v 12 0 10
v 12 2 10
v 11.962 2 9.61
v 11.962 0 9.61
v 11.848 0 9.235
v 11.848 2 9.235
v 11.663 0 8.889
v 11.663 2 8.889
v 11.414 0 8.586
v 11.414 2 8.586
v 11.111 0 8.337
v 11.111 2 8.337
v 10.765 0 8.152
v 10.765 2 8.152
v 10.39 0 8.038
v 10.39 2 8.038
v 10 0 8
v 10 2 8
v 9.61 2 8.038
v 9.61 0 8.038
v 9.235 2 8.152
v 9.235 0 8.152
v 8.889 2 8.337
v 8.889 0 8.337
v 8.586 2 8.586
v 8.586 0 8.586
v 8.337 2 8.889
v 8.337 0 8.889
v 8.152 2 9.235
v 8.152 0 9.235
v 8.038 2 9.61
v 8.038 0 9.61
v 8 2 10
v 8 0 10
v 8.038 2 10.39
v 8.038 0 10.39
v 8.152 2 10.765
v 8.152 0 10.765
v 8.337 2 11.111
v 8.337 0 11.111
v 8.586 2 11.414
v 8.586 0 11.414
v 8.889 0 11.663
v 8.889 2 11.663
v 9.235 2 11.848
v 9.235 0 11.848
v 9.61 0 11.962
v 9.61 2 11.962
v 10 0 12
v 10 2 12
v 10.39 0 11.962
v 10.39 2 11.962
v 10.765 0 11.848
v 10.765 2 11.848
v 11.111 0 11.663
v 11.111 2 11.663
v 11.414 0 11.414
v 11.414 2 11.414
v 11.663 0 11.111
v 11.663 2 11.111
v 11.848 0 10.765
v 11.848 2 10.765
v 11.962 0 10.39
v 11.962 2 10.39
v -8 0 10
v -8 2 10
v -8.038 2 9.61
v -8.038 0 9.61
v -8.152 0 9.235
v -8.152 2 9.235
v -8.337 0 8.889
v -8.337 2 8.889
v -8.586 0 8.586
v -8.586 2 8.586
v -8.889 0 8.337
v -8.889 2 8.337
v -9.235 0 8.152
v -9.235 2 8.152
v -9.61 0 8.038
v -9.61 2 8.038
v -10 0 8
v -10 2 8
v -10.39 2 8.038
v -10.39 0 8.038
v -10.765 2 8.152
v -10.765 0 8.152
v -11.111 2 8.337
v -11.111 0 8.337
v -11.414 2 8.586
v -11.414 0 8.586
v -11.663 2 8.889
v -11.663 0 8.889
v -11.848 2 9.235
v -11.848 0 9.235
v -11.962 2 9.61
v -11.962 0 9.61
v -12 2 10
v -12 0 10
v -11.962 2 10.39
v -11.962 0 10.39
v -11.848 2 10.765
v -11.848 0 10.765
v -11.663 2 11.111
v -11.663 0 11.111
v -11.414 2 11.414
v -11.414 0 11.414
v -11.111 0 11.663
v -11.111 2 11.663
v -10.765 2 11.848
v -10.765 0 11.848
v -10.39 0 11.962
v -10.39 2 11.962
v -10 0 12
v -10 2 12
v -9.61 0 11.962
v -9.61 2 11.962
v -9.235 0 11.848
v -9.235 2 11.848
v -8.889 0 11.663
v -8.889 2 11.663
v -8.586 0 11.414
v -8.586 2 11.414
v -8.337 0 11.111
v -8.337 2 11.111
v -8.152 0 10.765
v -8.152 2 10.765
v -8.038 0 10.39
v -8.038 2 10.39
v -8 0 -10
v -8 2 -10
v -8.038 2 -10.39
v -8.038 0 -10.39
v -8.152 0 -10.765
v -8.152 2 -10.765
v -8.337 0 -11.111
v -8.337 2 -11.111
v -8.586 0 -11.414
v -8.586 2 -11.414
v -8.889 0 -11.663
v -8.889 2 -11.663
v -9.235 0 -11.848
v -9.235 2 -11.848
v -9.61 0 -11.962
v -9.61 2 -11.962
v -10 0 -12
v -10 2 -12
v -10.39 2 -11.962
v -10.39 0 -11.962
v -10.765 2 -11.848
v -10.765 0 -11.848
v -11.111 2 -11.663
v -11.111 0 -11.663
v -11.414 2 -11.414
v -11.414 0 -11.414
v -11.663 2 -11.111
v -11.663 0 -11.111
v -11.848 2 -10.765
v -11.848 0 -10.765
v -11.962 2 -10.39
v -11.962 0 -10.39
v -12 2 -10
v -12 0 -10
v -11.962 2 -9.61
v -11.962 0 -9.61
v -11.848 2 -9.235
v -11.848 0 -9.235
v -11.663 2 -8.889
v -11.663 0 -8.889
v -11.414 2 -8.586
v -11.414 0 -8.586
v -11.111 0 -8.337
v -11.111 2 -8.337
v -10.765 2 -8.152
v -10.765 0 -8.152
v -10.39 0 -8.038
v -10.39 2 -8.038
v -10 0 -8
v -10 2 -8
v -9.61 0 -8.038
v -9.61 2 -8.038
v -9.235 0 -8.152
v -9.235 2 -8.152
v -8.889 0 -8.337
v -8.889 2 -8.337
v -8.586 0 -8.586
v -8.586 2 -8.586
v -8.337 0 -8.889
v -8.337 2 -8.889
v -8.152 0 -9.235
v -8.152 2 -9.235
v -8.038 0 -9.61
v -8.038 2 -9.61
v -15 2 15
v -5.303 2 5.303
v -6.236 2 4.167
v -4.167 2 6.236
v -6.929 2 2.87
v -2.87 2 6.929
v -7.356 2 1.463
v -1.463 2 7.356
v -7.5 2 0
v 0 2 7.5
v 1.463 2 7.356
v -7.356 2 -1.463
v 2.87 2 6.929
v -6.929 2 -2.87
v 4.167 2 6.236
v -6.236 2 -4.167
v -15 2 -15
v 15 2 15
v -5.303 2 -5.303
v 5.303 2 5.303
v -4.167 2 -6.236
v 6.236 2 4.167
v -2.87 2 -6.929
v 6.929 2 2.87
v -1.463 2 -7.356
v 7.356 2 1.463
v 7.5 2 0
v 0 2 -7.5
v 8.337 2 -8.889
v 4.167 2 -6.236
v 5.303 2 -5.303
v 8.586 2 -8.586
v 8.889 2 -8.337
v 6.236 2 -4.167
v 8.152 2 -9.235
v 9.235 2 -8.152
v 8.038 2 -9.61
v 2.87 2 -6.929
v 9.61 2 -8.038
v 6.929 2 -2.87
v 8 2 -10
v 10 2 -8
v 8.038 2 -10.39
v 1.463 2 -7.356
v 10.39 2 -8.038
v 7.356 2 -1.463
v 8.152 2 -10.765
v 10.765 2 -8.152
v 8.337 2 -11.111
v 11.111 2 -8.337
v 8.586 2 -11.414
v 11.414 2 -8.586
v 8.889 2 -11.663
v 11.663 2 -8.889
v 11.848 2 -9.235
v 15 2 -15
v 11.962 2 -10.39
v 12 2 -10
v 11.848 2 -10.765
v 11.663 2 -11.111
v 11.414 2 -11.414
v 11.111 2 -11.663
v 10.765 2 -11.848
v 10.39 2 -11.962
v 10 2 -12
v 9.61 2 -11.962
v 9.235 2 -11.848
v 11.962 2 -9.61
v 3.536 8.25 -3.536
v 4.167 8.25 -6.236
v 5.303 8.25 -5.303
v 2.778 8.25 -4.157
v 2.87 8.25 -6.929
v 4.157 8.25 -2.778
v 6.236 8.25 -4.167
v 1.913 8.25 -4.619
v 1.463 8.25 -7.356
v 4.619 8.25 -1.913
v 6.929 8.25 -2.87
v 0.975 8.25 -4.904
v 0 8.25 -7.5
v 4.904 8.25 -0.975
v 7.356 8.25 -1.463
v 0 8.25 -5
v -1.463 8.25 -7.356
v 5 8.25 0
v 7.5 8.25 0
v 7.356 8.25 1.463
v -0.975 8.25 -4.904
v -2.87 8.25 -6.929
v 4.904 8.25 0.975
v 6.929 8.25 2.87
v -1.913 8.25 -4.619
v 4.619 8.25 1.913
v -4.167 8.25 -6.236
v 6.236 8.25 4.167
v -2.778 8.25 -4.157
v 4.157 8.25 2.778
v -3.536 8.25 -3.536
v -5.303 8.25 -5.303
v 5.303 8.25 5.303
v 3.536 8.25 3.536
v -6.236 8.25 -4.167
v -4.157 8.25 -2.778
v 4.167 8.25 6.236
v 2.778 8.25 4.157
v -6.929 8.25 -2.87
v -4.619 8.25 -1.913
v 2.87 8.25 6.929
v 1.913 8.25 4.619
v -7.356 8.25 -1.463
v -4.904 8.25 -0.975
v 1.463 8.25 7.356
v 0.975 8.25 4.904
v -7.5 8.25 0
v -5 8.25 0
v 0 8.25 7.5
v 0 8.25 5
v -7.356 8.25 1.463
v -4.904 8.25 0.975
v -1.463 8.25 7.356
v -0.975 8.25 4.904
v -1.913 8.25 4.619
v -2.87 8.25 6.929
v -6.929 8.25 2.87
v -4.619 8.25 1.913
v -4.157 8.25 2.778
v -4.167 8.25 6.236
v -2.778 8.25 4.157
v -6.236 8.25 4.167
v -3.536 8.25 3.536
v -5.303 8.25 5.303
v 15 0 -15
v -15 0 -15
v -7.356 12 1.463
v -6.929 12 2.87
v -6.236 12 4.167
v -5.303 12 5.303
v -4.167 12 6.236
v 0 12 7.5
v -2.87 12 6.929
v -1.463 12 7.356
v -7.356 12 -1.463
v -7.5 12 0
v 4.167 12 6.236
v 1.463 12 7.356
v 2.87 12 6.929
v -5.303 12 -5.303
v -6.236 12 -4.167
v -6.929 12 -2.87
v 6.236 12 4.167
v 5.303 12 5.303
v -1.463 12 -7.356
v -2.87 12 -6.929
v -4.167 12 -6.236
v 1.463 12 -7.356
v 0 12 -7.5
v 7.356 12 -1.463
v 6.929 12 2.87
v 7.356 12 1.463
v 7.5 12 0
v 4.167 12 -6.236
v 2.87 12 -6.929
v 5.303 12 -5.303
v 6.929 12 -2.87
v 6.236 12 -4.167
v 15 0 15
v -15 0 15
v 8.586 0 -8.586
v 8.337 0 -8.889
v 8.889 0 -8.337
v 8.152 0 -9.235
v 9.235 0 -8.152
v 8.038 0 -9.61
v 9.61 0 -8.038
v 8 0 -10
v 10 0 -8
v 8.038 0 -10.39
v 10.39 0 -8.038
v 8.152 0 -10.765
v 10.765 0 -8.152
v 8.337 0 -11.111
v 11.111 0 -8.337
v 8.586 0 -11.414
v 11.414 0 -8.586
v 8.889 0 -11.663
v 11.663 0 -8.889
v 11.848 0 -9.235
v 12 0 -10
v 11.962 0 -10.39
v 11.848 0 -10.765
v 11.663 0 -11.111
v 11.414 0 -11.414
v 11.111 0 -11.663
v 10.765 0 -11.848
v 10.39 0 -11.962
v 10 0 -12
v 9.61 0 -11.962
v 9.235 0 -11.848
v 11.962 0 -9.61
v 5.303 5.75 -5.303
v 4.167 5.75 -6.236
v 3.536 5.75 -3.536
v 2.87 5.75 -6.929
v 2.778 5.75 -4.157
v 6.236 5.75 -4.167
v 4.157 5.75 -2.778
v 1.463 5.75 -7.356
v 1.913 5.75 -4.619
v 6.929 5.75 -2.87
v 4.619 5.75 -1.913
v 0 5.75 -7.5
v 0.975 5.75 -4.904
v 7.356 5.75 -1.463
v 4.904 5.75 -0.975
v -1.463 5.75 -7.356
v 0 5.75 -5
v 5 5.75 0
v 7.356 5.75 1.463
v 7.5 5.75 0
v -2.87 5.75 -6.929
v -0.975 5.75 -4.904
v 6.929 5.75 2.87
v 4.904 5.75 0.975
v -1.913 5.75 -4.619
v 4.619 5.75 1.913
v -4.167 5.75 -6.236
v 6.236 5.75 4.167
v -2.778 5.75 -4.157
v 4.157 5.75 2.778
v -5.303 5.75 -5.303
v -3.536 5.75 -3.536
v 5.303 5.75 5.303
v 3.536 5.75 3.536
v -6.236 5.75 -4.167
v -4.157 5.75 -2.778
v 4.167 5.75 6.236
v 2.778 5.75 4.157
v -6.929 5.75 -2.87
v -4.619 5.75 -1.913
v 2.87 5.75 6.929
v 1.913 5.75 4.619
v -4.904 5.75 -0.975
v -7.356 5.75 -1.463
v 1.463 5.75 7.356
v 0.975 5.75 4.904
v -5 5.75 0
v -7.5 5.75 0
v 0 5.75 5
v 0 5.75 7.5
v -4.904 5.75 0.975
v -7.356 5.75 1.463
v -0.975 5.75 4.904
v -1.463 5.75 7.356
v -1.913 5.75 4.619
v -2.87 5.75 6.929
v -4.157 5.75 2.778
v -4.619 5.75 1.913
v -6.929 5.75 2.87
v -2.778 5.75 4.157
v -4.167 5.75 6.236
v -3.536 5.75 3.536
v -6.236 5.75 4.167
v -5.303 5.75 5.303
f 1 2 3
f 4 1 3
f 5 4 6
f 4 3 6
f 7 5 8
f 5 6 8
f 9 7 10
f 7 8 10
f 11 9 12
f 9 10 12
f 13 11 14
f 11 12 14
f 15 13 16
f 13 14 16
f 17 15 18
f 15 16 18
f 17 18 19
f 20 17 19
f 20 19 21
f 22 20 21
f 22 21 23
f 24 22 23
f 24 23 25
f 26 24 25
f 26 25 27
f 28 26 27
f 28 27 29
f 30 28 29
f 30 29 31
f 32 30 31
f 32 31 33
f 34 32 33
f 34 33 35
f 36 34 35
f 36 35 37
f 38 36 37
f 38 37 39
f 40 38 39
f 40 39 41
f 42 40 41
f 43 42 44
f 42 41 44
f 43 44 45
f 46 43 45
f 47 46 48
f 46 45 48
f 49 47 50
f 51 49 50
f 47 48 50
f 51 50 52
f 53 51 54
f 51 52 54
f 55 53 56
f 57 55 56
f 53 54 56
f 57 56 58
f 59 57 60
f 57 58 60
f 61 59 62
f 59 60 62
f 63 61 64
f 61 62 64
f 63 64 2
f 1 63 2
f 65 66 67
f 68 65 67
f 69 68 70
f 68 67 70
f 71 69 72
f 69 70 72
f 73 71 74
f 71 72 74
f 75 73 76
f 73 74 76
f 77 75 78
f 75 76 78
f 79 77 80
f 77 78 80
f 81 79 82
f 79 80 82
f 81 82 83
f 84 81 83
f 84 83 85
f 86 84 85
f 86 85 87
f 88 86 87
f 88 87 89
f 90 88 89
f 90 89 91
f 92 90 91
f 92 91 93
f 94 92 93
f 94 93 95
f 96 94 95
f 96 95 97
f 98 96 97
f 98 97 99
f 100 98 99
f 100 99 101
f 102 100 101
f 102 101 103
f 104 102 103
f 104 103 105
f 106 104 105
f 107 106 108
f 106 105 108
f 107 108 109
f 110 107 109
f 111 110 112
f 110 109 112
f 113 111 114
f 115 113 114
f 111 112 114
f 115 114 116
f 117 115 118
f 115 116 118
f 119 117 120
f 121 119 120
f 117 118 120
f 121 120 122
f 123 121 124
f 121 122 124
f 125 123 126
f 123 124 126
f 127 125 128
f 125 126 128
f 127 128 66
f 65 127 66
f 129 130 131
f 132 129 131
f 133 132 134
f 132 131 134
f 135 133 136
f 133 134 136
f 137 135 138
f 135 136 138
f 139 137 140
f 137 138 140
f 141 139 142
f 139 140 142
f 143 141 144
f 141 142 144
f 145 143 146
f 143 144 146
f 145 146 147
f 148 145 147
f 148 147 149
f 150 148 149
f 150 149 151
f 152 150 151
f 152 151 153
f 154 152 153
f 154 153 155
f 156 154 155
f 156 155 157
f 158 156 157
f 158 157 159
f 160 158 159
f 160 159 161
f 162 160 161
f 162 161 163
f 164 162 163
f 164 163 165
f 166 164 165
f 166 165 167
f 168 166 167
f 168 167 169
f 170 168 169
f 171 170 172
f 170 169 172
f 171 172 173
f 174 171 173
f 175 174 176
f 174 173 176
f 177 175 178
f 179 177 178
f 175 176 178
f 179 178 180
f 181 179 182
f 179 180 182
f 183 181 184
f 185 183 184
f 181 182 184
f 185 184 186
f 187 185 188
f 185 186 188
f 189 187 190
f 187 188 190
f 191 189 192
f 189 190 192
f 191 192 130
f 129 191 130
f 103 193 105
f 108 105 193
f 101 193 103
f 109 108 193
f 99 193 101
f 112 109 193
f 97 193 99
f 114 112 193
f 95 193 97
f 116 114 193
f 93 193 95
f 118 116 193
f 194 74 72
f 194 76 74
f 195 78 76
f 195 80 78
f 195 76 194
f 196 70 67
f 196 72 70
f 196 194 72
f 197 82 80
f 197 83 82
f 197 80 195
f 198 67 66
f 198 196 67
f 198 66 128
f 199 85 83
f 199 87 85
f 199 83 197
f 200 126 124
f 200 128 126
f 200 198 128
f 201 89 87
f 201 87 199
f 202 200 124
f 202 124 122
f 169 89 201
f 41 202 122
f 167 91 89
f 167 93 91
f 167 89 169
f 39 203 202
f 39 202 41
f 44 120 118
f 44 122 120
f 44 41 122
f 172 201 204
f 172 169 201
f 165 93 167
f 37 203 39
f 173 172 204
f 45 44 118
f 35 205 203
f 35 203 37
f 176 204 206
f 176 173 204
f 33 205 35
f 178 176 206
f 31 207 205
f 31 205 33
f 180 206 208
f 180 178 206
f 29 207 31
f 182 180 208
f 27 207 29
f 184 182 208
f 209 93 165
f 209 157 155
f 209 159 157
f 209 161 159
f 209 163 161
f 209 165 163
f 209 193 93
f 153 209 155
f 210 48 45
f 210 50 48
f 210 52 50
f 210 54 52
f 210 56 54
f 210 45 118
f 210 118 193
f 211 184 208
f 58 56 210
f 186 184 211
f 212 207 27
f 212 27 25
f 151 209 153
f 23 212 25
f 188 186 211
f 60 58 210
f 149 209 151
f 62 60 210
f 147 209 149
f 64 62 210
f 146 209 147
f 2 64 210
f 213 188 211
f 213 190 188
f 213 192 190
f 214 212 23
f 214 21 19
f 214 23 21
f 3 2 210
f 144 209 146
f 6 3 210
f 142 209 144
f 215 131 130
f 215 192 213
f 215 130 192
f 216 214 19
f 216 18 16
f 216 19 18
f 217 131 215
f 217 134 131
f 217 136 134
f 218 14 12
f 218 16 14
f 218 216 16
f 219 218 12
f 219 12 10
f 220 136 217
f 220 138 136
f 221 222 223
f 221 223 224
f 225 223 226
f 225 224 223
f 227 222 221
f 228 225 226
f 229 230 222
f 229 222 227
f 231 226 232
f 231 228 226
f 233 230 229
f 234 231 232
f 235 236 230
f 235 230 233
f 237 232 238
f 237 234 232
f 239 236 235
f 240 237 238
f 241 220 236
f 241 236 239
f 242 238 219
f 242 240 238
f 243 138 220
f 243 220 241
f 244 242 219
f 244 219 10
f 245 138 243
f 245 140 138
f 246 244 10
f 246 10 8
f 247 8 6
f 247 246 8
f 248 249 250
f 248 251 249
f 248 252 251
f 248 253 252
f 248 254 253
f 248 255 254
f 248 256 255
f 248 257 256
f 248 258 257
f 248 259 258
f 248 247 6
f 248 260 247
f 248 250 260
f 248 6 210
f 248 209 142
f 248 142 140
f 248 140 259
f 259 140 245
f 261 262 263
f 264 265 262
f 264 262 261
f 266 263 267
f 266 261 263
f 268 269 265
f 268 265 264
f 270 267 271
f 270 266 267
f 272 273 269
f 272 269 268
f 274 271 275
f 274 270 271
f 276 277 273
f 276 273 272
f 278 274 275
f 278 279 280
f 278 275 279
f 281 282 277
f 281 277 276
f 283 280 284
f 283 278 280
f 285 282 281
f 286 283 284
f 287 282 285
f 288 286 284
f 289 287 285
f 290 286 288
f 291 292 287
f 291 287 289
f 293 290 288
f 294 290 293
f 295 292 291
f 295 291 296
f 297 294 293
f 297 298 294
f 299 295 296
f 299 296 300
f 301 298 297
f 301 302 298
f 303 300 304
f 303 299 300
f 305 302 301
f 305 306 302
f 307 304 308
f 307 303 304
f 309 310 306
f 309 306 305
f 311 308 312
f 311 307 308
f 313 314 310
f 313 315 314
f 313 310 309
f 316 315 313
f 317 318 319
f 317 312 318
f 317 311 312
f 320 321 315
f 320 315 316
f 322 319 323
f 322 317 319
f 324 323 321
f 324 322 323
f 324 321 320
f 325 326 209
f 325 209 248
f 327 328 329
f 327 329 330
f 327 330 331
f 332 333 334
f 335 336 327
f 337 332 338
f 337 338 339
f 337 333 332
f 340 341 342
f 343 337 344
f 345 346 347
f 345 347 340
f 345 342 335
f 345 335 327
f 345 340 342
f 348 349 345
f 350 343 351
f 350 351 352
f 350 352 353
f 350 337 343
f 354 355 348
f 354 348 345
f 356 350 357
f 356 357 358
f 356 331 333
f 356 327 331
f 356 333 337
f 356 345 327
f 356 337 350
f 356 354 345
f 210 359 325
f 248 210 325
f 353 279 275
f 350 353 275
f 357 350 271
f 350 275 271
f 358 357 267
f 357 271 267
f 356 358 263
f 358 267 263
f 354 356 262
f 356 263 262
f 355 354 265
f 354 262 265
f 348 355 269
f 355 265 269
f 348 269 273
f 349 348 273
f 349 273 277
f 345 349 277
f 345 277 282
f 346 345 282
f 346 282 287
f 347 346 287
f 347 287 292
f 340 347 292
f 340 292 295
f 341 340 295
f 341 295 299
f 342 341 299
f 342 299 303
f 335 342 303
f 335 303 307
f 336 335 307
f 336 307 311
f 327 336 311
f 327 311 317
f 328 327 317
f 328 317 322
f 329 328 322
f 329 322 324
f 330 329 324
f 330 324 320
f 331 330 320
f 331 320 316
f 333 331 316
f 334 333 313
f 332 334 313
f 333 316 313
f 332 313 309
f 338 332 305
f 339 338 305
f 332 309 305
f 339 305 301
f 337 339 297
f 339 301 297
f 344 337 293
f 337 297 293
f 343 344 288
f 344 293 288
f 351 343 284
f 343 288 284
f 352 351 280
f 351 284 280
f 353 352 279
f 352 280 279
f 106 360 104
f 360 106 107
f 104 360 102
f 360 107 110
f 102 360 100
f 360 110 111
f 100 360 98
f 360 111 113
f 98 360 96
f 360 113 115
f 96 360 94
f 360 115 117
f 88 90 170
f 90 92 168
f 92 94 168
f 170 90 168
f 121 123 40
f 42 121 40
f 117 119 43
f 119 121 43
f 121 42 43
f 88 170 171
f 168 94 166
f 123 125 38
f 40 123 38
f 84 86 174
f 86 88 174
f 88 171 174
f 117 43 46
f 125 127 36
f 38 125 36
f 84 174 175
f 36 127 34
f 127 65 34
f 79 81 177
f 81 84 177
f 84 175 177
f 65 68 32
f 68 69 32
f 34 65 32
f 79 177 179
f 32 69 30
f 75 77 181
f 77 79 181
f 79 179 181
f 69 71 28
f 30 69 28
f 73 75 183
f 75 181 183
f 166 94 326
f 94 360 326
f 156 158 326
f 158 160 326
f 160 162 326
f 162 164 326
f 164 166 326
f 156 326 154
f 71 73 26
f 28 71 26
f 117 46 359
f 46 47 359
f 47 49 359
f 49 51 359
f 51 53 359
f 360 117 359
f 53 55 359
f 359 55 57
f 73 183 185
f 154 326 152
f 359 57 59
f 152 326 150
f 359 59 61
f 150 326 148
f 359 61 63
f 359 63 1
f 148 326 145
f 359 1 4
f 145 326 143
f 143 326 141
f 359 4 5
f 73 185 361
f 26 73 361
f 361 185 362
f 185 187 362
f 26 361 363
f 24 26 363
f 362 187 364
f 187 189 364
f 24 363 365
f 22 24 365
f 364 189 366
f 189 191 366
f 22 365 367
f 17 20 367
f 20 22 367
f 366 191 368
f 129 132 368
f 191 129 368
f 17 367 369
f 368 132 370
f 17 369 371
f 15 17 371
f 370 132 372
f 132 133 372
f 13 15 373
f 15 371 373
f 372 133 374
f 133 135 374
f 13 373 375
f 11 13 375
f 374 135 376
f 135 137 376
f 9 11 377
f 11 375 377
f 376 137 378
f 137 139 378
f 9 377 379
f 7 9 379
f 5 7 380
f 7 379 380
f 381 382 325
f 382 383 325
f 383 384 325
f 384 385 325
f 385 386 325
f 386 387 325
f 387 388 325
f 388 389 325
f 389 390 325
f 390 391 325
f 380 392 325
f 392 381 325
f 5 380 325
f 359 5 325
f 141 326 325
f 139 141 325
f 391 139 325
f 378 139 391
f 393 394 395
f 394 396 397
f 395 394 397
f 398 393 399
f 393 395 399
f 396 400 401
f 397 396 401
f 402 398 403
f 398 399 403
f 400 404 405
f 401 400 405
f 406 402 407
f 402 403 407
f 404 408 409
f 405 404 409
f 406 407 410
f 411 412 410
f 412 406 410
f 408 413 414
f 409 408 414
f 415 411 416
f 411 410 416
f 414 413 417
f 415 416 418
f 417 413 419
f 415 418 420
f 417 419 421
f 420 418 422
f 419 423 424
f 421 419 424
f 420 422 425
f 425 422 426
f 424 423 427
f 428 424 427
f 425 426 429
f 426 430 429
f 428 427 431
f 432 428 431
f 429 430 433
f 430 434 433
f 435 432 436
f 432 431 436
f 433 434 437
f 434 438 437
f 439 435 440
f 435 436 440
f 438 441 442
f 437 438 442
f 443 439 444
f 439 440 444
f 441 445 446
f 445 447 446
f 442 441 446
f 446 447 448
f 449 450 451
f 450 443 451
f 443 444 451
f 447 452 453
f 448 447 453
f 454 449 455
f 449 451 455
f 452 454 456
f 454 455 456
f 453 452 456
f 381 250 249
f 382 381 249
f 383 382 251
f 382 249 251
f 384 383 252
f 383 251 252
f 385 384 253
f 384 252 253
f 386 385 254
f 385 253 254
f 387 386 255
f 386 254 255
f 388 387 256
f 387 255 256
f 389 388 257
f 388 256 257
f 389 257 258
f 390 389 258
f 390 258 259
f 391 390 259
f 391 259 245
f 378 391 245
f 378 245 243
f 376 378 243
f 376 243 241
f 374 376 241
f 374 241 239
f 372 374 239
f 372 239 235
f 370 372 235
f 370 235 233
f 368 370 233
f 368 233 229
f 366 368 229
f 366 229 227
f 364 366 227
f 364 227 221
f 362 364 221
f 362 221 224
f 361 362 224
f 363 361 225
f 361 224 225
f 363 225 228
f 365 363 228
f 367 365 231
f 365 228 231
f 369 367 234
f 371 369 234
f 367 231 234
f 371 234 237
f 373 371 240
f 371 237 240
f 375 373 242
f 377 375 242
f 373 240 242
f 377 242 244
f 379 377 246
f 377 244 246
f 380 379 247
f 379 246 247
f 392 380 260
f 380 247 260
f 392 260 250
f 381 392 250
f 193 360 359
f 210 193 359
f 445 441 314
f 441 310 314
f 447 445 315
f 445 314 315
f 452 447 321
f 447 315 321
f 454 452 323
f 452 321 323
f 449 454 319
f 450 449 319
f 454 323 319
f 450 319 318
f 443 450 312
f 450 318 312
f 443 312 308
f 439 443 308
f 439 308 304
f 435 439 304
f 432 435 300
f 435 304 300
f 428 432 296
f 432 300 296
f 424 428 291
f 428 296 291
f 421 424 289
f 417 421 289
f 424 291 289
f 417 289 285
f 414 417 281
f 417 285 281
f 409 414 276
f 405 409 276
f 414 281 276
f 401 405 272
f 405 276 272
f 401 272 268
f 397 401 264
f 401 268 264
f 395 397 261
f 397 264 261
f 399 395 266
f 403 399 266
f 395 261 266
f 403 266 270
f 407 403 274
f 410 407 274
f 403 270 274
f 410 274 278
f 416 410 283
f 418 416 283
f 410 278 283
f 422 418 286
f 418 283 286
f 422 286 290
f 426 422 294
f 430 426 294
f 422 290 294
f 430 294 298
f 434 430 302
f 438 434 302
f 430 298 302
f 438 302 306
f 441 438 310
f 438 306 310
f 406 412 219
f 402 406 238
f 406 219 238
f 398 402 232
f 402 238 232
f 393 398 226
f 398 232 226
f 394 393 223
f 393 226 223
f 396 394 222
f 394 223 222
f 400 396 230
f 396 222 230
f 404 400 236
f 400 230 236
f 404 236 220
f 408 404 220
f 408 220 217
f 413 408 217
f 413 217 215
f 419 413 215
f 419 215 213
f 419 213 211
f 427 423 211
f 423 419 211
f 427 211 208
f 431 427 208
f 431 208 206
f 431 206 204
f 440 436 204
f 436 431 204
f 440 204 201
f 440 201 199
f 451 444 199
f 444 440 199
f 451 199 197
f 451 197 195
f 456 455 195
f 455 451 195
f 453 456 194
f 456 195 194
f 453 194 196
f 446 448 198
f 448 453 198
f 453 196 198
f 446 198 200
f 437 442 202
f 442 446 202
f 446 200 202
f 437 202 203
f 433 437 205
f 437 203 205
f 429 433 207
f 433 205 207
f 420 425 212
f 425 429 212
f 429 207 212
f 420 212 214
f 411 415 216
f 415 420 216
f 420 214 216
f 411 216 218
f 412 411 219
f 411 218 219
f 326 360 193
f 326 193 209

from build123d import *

# Parameters (mm, degrees)
SKETCH1_W           = 30
SKETCH1_H           = 30
BOSS_EXTRUDE1_DEPTH = 2
SKETCH3_R           = 2
CUT_EXTRUDE1_DEPTH  = 5
SKETCH2_R           = 7.5
BOSS_EXTRUDE2_DEPTH = 10
SKETCH4_W           = 5
SKETCH4_H           = 2.5


with BuildPart() as part:
    # Sketch1 → Boss-Extrude1 (new body)
    with BuildSketch(Plane(origin=(0, 0, 0), x_dir=(1, 0, 0), z_dir=(0, 1, 0))):
        Rectangle(SKETCH1_W, SKETCH1_H)
    extrude(amount=BOSS_EXTRUDE1_DEPTH)

    # Sketch3 → Cut-Extrude1 (cut)
    with BuildSketch(Plane(origin=(0, 2, 0), x_dir=(1, 0, 0), z_dir=(0, 1, 0))):
        with Locations((-10, 10)):
            Circle(SKETCH3_R)
        with Locations((10, 10)):
            Circle(SKETCH3_R)
        with Locations((10, -10)):
            Circle(SKETCH3_R)
        with Locations((-10, -10)):
            Circle(SKETCH3_R)
    extrude(amount=-CUT_EXTRUDE1_DEPTH, mode=Mode.SUBTRACT)

    # Sketch2 → Boss-Extrude2 (add)
    with BuildSketch(Plane(origin=(0, 2, 0), x_dir=(1, 0, 0), z_dir=(0, 1, 0))):
        Circle(SKETCH2_R)
    extrude(amount=BOSS_EXTRUDE2_DEPTH)

    # Sketch4 → Cut-Revolve1 (revolve, cut)
    with BuildSketch(Plane(origin=(0, 0, 0), x_dir=(0, 0, -1), z_dir=(1, 0, 0))):
        with Locations((-7.5, 7)):
            Rectangle(SKETCH4_W, SKETCH4_H)
    revolve(axis=Axis((0, 16.444012907, 0), (0, -1, 0)), mode=Mode.SUBTRACT)


solid = part.part
